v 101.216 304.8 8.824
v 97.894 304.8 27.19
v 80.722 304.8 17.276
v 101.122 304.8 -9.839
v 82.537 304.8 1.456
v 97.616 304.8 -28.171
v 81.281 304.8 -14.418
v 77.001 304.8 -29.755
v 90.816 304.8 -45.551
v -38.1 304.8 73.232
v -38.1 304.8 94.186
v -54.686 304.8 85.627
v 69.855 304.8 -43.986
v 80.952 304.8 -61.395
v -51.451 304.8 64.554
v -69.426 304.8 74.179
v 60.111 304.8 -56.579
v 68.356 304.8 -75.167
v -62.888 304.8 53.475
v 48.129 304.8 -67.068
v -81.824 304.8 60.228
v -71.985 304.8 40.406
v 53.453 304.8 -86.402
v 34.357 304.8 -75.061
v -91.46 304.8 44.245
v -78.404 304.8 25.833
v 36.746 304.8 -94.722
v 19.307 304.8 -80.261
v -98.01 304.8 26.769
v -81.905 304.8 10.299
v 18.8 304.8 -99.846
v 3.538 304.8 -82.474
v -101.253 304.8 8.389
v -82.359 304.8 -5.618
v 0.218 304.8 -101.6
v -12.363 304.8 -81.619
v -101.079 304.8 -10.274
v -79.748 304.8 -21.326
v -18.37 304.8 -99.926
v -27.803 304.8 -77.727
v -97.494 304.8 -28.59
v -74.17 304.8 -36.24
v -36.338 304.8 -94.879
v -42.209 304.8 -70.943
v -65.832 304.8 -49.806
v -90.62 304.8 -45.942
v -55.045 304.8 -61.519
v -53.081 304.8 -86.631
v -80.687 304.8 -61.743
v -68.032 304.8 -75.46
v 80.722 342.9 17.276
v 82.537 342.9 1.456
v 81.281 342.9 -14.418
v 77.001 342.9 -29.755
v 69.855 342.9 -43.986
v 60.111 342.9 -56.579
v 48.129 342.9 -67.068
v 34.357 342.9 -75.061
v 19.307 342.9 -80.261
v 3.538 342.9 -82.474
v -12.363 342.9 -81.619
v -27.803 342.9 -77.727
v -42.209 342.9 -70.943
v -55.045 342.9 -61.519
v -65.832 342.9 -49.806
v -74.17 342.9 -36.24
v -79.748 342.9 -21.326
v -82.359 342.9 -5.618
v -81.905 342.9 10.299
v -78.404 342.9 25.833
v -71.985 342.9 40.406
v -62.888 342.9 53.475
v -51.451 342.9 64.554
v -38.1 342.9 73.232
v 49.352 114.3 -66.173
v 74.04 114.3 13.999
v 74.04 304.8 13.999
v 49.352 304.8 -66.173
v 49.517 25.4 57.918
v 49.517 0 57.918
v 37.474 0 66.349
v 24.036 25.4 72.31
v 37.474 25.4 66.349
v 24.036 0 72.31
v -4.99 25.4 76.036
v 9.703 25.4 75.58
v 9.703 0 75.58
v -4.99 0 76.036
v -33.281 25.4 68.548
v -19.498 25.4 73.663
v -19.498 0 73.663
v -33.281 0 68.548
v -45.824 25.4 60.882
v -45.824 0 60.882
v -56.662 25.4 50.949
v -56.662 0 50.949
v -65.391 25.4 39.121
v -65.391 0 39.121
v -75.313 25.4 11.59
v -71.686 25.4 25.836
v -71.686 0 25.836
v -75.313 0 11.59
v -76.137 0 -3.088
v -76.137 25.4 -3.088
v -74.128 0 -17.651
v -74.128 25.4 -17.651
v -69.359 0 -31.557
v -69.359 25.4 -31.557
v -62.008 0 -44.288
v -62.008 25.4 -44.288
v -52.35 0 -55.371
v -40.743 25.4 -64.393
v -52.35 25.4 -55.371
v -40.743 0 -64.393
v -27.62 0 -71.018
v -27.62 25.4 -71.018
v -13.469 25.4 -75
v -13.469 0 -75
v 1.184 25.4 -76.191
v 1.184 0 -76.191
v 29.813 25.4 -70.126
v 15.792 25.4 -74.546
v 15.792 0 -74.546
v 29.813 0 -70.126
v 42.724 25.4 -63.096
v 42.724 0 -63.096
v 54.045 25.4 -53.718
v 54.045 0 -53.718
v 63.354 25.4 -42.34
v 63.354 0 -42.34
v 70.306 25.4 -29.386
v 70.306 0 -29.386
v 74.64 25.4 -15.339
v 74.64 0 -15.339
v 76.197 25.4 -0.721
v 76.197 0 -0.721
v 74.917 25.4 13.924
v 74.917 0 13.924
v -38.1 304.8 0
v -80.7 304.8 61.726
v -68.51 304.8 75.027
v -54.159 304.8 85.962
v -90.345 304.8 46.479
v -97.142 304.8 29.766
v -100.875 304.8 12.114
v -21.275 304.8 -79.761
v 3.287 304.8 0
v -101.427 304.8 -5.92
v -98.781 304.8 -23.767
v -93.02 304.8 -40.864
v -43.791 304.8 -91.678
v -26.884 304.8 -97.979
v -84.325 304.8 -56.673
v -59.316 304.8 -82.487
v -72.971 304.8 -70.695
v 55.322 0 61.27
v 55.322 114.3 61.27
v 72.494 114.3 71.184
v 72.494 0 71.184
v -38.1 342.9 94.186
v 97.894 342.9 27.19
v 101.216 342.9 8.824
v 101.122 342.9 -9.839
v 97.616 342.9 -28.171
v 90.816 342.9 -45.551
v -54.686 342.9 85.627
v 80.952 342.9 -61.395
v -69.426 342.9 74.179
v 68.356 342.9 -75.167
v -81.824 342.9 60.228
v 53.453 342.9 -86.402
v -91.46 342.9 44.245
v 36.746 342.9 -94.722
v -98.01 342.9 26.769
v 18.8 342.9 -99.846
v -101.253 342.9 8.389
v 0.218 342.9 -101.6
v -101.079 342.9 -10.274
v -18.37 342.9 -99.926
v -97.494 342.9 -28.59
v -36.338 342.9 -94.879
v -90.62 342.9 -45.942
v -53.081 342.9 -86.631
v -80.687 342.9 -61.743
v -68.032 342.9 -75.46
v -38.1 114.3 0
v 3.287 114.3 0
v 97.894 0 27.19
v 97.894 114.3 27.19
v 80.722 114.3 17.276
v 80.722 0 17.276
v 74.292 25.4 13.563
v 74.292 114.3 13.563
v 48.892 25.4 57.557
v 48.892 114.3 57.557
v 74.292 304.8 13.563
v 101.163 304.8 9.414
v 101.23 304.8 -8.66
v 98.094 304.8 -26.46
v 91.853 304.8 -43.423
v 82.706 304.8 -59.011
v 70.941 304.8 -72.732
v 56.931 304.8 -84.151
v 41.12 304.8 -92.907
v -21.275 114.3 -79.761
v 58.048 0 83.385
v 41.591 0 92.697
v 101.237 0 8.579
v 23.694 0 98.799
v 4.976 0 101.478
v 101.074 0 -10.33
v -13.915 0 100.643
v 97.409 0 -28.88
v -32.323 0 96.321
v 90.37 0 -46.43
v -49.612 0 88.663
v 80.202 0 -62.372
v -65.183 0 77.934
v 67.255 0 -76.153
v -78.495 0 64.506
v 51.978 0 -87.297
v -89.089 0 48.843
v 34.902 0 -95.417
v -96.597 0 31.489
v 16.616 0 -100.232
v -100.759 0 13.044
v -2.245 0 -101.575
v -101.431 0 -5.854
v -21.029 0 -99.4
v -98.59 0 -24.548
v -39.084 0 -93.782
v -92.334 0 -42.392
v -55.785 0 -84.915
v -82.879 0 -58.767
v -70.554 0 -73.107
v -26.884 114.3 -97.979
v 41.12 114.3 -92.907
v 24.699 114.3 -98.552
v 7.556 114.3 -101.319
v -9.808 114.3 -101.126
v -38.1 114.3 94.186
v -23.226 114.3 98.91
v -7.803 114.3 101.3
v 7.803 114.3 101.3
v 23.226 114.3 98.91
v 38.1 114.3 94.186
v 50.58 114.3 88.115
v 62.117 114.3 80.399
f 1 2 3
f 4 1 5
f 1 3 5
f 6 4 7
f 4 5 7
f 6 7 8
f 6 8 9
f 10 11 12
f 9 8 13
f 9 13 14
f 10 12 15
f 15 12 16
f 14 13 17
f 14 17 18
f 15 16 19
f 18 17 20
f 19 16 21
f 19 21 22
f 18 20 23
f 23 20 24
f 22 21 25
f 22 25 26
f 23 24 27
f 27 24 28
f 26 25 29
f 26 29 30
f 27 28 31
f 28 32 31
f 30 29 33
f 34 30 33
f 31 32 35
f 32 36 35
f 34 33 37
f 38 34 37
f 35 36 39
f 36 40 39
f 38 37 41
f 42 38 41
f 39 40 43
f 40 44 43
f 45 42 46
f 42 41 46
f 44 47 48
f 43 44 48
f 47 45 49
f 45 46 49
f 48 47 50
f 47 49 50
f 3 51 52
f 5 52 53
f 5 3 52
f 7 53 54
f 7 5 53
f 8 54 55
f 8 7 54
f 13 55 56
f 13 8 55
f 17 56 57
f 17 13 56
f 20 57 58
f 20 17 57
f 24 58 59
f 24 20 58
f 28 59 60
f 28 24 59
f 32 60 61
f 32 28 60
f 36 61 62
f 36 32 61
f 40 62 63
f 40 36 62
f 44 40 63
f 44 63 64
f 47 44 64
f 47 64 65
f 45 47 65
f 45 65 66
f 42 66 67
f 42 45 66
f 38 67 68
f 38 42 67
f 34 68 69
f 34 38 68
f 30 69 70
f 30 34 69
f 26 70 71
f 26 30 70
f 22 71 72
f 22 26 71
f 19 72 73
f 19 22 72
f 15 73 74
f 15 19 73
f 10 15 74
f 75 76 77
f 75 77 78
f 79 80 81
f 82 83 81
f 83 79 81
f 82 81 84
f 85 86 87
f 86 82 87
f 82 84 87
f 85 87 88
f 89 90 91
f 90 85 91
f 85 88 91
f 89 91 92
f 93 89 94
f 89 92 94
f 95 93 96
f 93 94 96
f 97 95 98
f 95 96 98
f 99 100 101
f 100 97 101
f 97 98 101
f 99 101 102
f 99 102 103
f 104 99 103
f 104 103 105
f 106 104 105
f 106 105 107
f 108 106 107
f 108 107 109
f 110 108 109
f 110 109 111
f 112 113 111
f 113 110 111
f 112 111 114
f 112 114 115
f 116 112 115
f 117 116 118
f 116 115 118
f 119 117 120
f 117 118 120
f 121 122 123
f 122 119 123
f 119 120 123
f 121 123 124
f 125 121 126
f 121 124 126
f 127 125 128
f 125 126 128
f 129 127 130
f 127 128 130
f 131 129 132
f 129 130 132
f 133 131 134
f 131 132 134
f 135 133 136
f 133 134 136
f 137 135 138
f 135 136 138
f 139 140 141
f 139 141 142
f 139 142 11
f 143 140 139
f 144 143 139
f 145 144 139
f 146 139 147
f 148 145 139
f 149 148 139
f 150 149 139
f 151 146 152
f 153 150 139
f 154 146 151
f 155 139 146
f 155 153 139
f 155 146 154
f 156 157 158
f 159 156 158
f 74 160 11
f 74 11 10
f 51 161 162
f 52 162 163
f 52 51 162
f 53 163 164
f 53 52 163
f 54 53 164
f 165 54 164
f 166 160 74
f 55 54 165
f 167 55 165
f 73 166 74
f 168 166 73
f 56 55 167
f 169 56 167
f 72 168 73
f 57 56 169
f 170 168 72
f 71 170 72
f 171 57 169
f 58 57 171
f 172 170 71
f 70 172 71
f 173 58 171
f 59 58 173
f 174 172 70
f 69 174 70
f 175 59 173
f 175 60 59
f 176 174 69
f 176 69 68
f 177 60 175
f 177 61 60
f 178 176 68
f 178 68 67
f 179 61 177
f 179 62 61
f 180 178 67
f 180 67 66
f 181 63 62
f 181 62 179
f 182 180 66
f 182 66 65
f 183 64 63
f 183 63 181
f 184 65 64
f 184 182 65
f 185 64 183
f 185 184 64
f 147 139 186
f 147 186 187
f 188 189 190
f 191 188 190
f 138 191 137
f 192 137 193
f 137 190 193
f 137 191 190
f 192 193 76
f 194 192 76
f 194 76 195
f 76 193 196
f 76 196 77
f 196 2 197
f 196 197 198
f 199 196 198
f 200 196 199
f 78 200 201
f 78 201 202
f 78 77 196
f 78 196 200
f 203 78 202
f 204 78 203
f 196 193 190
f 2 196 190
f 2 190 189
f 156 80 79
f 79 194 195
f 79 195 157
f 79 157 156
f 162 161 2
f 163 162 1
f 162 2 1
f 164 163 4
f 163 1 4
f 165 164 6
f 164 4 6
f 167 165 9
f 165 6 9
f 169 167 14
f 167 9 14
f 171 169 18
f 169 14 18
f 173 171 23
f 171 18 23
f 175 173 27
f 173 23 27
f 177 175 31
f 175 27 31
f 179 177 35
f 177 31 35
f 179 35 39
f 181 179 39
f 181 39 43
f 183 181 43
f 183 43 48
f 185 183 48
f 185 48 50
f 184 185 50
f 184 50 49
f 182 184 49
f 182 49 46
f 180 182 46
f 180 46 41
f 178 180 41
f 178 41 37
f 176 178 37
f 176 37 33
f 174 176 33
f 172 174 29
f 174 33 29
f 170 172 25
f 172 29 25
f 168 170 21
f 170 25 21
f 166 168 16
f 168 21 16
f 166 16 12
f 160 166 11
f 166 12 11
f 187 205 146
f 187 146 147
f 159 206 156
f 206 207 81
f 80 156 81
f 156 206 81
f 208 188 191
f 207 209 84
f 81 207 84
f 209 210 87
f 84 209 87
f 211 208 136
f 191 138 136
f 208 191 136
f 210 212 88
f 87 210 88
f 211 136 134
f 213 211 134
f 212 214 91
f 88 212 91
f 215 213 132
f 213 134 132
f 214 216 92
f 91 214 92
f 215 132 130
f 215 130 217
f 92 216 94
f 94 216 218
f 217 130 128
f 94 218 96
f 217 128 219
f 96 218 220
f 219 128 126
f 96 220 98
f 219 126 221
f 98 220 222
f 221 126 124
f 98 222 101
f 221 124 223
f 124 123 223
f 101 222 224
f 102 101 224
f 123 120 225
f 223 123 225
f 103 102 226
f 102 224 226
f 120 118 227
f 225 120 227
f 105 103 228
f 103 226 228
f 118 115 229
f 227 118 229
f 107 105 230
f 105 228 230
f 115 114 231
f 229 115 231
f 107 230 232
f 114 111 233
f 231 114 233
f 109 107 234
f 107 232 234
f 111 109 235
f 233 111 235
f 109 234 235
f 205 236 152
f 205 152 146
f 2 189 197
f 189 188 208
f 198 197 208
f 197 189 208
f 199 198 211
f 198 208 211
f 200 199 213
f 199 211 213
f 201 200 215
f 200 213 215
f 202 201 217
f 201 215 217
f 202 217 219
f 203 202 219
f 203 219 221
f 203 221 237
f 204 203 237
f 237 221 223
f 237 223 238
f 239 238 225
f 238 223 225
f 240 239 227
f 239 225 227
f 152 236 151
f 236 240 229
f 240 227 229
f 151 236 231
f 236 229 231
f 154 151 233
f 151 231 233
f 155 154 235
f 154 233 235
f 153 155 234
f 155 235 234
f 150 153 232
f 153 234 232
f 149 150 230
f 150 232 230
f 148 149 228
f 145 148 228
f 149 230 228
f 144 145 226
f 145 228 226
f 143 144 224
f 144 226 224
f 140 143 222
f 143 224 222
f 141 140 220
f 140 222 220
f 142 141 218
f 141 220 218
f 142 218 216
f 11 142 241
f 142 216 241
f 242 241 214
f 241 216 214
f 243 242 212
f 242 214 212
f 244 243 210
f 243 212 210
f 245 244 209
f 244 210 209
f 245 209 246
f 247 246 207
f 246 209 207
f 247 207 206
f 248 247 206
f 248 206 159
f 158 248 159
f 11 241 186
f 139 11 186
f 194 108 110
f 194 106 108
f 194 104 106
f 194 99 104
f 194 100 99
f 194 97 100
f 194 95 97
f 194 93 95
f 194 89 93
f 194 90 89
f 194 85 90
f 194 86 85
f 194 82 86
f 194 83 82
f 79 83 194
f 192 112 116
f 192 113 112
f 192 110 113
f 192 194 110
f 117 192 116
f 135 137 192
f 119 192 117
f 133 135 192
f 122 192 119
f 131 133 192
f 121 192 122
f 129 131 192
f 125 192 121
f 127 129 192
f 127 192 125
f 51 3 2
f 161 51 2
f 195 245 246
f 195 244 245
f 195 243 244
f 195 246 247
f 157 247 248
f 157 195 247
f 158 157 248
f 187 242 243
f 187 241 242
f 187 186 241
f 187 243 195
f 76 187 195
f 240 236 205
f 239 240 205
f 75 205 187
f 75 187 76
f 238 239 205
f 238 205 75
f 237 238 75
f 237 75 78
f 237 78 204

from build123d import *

# Parameters (mm, degrees)
SKETCH2_R           = 101.6
BOSS_EXTRUDE1_DEPTH = 304.8
SKETCH3_R           = 101.6
SKETCH3_R_2         = 82.55
BOSS_EXTRUDE2_DEPTH = 38.1
SKETCH4_W           = 76.2
SKETCH4_H           = 101.6
CUT_EXTRUDE1_DEPTH  = 228.6
CUT_EXTRUDE2_START  = -228.6
CUT_EXTRUDE2_DEPTH  = 190.5
SKETCH5_R           = 76.2
CUT_EXTRUDE3_DEPTH  = 25.4
CUT_EXTRUDE4_START  = -228.6
CUT_EXTRUDE4_DEPTH  = 228.6
CUT_EXTRUDE5_DEPTH  = 372.786941675


with BuildPart() as part:
    # Sketch2 → Boss-Extrude1 (new body)
    with BuildSketch(Plane(origin=(0, 0, 0), x_dir=(1, 0, 0), z_dir=(0, 1, 0))):
        with Locations(Location((0, 0, 0), (0, 0, 90))):
            Circle(SKETCH2_R)
    extrude(amount=BOSS_EXTRUDE1_DEPTH)


with BuildPart() as body_2:
    # Sketch3 → Boss-Extrude2 (new body)
    with BuildSketch(Plane(origin=(0, 304.8, 0), x_dir=(1, 0, 0), z_dir=(0, 1, 0))):
        with Locations(Location((0, 0, 0), (0, 0, 90))):
            Circle(SKETCH3_R)
        with Locations(Location((0, 0, 0), (0, 0, 90))):
            Circle(SKETCH3_R_2, mode=Mode.SUBTRACT)
    extrude(amount=BOSS_EXTRUDE2_DEPTH)


with BuildPart() as cut_extrude1_tool:
    # Sketch4 → Cut-Extrude1 (new body)
    with BuildSketch(Plane(origin=(0, 342.9, 0), x_dir=(1, 0, 0), z_dir=(0, 1, 0))):
        with Locations((0, -50.8)):
            Rectangle(SKETCH4_W, SKETCH4_H)
    extrude(amount=-CUT_EXTRUDE1_DEPTH)


with BuildPart() as part_1:
    add(part.part)

    # Cut-Extrude1: cut by cut_extrude1_tool
    add(cut_extrude1_tool.part, mode=Mode.SUBTRACT)

    # Sketch4<4> → Cut-Extrude2 (cut)
    with BuildSketch(Plane(origin=(0, 342.9, 0), x_dir=(1, 0, 0), z_dir=(0, 1, 0)).offset(CUT_EXTRUDE2_START)):
        with BuildLine():
            ThreePointArc((78.027556588, -26.94815231), (62.505565542, -53.92176533), (38.1, -73.231772476))
            Line((38.1, -73.231772476), (38.1, -94.185720786))
            ThreePointArc((38.1, -94.185720786), (65.394822961, -77.756524678), (86.259952515, -53.682218584))
            Line((86.259952515, -53.682218584), (78.027556588, -26.94815231))
        make_face()
        with BuildLine():
            Line((-21.27474203, 79.761443389), (3.286721048, 0))
            Line((3.286721048, 0), (38.1, 0))
            Line((38.1, 0), (38.1, -73.231772476))
            ThreePointArc((38.1, -73.231772476), (62.505565542, -53.92176533), (78.027556588, -26.94815231))
            Line((78.027556588, -26.94815231), (49.352145598, 66.173017347))
            ThreePointArc((49.352145598, 66.173017347), (15.596361061, 81.063284054), (-21.27474203, 79.761443389))
        make_face()
        with BuildLine():
            Line((-26.884440108, 97.978502132), (-21.27474203, 79.761443389))
            ThreePointArc((-21.27474203, 79.761443389), (15.596361061, 81.063284054), (49.352145598, 66.173017347))
            Line((49.352145598, 66.173017347), (41.119749671, 92.907083621))
            ThreePointArc((41.119749671, 92.907083621), (7.555847472, 101.318651634), (-26.884440108, 97.978502132))
        make_face()
    extrude(amount=CUT_EXTRUDE2_DEPTH, mode=Mode.SUBTRACT)

    # Sketch5 → Cut-Extrude3 (cut)
    with BuildSketch(Plane.XZ):
        with Locations(Location((0, 0, 0), (0, 0, 270))):
            Circle(SKETCH5_R)
    extrude(amount=-CUT_EXTRUDE3_DEPTH, mode=Mode.SUBTRACT)


with BuildPart() as body_2_1:
    add(body_2.part)

    # Cut-Extrude1: cut by cut_extrude1_tool
    add(cut_extrude1_tool.part, mode=Mode.SUBTRACT)


with BuildPart() as cut_extrude4_tool:
    # Sketch6 → Cut-Extrude4 (new body)
    with BuildSketch(Plane(origin=(0, 342.9, 0), x_dir=(1, 0, 0), z_dir=(0, 1, 0)).offset(CUT_EXTRUDE4_START)):
        Polygon((48.891726717, -57.557045256), (74.291726717, -13.562954744), (107.287294601, -32.612954744), (60.297294601, -114.002022192), (14.155449479, -87.362015489), (35.745449479, -49.967038554), align=None)
    extrude(amount=CUT_EXTRUDE4_DEPTH)


with BuildPart() as part_2:
    add(part_1.part)

    # Cut-Extrude4: cut by cut_extrude4_tool
    add(cut_extrude4_tool.part, mode=Mode.SUBTRACT)

    # Sketch6<4> → Cut-Extrude5 (cut, through all)
    with BuildSketch(Plane(origin=(0, 342.9, 0), x_dir=(1, 0, 0), z_dir=(0, 1, 0))):
        with BuildLine():
            ThreePointArc((97.894189943, -27.189843241), (87.988181024, -50.8), (72.494189943, -71.183933753))
            Line((72.494189943, -71.183933753), (81.887294601, -76.607045256))
            Line((81.887294601, -76.607045256), (107.287294601, -32.612954744))
            Line((107.287294601, -32.612954744), (97.894189943, -27.189843241))
        make_face()
        with BuildLine():
            ThreePointArc((80.722105782, -17.275535828), (71.490397082, -41.275), (55.322105782, -61.26962634))
            Line((55.322105782, -61.26962634), (72.494189943, -71.183933753))
            ThreePointArc((72.494189943, -71.183933753), (87.988181024, -50.8), (97.894189943, -27.189843241))
            Line((97.894189943, -27.189843241), (80.722105782, -17.275535828))
        make_face()
        with BuildLine():
            Line((74.291726717, -13.562954744), (48.891726717, -57.557045256))
            Line((48.891726717, -57.557045256), (55.322105782, -61.26962634))
            ThreePointArc((55.322105782, -61.26962634), (71.490397082, -41.275), (80.722105782, -17.275535828))
            Line((80.722105782, -17.275535828), (74.291726717, -13.562954744))
        make_face()
    extrude(amount=-CUT_EXTRUDE5_DEPTH, mode=Mode.SUBTRACT)


with BuildPart() as body_2_2:
    add(body_2_1.part)

    # Cut-Extrude4: cut by cut_extrude4_tool
    add(cut_extrude4_tool.part, mode=Mode.SUBTRACT)


solid = Compound([part_2.part, body_2_2.part])
